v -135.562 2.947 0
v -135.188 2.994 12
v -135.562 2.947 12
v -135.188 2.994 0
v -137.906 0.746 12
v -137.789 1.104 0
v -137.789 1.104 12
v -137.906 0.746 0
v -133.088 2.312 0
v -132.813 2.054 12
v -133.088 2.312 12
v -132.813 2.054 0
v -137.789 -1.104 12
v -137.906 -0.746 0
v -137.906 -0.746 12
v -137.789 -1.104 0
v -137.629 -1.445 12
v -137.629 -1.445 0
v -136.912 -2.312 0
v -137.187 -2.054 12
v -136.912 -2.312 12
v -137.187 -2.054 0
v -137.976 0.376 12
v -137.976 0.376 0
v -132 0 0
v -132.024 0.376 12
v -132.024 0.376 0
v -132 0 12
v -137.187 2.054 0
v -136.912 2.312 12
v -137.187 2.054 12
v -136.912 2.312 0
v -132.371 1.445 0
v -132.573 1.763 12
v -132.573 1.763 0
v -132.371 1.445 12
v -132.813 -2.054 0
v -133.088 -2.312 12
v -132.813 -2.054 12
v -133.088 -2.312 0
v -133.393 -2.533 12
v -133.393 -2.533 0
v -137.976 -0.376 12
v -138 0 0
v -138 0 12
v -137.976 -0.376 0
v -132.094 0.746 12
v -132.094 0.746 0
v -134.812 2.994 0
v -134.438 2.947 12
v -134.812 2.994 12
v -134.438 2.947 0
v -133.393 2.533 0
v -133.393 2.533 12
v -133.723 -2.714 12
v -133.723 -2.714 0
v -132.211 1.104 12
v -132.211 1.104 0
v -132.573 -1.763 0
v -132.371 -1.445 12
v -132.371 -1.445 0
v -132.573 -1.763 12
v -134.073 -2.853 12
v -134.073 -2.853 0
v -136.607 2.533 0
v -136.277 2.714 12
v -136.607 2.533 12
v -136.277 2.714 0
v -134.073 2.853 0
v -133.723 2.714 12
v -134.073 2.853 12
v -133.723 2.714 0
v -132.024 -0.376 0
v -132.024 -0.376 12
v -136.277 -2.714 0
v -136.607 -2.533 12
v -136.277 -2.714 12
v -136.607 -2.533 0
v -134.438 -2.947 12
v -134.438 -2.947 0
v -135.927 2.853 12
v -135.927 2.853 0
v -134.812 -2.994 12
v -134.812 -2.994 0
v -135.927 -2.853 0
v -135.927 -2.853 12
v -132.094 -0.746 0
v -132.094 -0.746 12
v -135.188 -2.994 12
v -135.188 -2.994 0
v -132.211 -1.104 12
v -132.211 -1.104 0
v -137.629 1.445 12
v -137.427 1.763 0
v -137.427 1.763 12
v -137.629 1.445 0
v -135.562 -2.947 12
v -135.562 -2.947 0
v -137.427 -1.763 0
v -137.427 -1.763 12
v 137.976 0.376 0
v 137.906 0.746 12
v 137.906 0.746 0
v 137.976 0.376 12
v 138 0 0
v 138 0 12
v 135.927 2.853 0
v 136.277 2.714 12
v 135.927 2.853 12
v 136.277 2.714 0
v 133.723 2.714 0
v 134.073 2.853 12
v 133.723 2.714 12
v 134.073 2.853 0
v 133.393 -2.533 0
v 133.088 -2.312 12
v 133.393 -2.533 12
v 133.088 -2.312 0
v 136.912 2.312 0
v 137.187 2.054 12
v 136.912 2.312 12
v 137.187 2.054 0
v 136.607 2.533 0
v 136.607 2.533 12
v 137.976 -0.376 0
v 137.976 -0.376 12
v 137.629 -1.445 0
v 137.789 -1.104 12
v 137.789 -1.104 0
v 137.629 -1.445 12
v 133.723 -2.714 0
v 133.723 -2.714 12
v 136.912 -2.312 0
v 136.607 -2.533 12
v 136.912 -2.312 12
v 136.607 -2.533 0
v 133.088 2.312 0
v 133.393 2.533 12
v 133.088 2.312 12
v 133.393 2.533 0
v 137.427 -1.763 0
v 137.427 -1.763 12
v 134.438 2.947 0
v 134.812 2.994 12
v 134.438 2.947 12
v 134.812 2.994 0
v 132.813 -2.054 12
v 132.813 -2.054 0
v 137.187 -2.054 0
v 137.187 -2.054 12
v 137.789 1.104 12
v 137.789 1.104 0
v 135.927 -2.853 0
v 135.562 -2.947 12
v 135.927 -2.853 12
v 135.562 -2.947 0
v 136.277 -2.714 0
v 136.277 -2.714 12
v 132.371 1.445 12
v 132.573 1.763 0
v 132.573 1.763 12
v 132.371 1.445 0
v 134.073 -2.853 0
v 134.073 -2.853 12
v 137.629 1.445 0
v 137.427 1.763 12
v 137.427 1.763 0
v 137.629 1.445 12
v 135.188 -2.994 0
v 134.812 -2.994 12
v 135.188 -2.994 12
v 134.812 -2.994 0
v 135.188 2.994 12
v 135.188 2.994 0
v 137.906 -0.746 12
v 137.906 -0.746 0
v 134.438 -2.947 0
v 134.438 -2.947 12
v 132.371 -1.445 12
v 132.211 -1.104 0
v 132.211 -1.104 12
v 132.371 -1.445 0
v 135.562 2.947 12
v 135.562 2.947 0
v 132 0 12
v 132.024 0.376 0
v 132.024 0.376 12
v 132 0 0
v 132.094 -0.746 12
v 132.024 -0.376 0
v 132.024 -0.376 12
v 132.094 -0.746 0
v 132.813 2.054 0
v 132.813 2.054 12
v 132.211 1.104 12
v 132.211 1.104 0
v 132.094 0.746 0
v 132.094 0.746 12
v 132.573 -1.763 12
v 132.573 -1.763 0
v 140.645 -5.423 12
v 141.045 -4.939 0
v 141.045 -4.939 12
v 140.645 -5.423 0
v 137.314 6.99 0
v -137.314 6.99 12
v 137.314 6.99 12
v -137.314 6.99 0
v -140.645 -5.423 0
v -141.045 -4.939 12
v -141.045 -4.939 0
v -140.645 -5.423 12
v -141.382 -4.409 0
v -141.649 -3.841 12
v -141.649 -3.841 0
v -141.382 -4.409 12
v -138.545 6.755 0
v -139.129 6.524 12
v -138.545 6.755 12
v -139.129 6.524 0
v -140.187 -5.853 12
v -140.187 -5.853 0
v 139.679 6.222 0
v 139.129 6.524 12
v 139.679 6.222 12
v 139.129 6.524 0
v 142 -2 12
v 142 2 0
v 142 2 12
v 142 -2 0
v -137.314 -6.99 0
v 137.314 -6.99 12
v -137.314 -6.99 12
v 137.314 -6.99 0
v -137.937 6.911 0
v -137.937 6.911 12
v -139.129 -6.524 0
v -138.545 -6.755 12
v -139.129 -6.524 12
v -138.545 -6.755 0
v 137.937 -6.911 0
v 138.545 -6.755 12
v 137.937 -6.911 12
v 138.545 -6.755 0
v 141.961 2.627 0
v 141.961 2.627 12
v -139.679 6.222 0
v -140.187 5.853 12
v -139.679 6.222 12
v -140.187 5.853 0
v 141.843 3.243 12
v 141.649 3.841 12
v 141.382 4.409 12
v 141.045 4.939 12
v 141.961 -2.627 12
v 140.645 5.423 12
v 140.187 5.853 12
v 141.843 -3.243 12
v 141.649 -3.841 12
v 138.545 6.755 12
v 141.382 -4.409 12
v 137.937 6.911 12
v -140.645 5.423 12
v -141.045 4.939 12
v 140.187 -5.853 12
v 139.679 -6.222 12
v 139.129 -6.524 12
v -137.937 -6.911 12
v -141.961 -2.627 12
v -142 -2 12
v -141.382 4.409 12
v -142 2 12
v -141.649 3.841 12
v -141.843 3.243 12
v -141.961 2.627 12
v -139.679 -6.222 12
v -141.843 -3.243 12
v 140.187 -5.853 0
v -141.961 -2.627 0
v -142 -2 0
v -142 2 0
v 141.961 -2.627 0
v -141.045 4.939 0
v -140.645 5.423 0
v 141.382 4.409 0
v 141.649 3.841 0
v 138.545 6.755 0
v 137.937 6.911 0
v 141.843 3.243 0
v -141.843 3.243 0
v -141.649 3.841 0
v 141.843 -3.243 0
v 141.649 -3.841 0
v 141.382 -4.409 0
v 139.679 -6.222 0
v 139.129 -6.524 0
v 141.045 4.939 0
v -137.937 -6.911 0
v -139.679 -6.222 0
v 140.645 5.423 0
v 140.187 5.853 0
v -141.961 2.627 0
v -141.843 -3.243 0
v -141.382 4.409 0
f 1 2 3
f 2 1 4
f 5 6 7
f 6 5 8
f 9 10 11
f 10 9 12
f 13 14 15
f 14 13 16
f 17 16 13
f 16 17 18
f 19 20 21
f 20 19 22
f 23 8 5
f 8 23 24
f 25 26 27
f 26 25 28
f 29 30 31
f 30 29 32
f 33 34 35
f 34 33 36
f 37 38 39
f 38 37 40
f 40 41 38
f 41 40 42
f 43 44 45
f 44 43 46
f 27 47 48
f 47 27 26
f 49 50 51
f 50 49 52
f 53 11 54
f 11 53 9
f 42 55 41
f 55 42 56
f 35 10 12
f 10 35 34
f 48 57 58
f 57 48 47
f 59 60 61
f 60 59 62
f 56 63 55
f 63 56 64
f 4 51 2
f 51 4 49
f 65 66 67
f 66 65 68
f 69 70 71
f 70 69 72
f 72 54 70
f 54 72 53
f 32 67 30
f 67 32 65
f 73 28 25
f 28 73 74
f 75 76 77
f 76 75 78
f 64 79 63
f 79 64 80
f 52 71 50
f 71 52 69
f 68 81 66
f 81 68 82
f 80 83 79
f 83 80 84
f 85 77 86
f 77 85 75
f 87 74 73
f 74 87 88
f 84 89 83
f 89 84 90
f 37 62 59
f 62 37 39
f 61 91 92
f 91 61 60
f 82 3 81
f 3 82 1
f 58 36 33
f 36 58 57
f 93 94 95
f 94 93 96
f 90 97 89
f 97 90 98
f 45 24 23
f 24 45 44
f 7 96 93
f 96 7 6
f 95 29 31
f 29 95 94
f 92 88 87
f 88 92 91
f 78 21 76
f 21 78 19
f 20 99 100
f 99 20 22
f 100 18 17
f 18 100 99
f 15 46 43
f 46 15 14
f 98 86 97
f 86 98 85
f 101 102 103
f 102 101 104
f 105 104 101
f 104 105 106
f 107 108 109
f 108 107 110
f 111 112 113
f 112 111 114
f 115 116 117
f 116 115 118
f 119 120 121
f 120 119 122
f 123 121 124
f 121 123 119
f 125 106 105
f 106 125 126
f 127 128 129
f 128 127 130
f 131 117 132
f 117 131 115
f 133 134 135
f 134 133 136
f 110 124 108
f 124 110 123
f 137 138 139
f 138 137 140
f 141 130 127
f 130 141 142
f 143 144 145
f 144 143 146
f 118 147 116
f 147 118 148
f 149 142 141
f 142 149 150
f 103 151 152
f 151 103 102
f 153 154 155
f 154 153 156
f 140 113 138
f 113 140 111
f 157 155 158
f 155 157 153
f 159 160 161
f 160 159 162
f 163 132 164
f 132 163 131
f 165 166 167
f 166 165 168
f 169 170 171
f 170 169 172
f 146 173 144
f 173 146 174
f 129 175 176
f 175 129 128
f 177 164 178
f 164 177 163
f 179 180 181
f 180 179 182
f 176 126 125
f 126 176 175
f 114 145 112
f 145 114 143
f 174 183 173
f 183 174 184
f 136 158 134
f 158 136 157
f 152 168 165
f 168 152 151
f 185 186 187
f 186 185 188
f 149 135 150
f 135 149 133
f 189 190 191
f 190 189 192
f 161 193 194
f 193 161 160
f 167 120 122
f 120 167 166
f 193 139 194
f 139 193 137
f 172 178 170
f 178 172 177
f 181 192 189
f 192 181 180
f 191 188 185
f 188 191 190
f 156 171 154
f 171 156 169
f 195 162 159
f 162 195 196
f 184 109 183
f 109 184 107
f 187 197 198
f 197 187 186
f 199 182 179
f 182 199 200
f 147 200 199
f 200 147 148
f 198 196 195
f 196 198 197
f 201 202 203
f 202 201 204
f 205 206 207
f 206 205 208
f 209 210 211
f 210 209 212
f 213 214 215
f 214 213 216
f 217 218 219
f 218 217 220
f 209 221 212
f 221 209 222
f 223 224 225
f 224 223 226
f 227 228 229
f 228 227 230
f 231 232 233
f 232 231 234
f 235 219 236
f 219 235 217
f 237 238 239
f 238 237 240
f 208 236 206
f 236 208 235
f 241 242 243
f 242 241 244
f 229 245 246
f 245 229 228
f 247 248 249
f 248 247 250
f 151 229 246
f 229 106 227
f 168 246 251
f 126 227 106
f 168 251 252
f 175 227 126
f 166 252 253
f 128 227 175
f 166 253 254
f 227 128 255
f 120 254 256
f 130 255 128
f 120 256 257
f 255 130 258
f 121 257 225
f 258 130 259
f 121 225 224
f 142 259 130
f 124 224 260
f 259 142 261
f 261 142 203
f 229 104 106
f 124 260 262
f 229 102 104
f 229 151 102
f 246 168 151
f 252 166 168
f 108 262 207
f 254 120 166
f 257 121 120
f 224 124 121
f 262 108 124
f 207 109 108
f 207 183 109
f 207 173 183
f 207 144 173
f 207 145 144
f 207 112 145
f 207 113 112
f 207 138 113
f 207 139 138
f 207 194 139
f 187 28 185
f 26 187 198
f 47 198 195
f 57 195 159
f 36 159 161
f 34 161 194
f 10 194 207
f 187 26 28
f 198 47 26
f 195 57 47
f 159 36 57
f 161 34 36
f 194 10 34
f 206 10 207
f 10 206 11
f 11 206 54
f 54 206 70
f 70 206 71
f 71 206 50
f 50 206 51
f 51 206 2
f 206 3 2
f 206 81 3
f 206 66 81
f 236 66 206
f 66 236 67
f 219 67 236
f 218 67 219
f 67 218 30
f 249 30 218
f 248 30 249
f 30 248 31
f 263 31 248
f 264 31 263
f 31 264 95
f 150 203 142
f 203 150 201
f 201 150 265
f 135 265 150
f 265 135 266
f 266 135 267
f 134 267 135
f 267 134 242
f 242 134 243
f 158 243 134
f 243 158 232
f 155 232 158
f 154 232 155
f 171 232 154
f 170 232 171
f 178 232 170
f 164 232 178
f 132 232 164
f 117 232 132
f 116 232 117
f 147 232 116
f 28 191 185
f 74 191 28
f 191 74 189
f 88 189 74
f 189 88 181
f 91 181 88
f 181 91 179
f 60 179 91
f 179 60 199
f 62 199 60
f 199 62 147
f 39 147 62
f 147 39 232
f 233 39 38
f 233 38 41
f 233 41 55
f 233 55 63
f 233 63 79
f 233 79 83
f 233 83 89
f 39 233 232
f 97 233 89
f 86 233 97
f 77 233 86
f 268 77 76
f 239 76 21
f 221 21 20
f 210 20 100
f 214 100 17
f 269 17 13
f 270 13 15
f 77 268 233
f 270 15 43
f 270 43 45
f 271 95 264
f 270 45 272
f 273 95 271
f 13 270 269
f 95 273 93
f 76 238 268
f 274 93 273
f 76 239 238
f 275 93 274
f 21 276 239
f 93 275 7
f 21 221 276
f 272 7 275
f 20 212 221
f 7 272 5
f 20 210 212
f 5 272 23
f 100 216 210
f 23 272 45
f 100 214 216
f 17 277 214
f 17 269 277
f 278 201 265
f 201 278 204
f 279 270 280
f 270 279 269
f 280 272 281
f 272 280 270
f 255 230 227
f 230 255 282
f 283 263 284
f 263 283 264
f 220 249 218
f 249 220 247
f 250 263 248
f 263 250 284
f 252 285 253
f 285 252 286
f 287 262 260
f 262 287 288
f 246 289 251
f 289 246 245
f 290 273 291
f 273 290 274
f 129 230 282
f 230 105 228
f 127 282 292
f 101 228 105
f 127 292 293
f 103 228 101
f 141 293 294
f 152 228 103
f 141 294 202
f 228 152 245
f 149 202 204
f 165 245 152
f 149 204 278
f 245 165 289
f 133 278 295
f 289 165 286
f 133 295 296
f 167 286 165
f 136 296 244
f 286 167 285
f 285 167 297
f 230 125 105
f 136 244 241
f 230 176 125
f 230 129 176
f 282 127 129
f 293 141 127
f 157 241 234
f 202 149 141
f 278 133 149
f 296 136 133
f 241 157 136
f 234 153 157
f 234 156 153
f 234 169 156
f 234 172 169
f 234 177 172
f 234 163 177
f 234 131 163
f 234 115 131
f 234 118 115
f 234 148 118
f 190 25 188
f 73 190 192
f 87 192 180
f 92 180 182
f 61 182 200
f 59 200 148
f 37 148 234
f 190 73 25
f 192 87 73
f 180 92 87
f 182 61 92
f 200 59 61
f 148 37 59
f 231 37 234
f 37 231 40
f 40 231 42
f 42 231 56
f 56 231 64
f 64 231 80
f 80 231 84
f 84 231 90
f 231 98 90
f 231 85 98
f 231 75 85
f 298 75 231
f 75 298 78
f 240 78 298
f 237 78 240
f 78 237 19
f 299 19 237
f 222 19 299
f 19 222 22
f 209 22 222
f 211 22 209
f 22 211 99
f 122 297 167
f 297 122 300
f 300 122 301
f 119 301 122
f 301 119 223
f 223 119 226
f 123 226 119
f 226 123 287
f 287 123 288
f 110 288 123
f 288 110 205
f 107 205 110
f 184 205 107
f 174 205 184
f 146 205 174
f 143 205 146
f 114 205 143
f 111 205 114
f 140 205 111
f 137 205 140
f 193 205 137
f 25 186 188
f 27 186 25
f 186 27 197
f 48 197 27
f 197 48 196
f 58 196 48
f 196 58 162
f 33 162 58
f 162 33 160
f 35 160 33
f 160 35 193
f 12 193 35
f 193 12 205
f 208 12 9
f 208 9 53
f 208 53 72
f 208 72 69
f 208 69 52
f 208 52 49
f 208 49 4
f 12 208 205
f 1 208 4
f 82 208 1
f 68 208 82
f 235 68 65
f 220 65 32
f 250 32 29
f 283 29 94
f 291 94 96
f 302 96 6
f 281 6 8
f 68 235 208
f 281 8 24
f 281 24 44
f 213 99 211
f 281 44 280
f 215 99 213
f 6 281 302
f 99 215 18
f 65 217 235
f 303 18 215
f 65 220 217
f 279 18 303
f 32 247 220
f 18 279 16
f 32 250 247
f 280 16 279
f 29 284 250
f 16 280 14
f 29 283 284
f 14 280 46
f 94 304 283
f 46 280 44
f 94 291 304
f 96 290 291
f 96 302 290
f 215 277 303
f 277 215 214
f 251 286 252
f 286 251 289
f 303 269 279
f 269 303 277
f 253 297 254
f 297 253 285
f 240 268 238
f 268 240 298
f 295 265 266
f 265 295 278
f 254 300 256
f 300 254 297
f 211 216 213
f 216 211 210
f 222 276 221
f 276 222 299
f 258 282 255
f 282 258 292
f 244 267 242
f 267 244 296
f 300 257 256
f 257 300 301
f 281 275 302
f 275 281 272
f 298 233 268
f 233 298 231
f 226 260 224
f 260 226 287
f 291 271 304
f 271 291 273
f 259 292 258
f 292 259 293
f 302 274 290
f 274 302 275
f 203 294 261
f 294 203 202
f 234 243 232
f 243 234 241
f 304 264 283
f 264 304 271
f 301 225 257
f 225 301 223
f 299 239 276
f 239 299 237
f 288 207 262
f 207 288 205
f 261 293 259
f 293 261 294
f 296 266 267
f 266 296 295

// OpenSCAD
$fn = 50;


difference() {
	union() {
		hull() {
			translate(v = [-137.0000000000, 2.0000000000, 0]) {
				cylinder(h = 12, r = 5);
			}
			translate(v = [137.0000000000, 2.0000000000, 0]) {
				cylinder(h = 12, r = 5);
			}
			translate(v = [-137.0000000000, -2.0000000000, 0]) {
				cylinder(h = 12, r = 5);
			}
			translate(v = [137.0000000000, -2.0000000000, 0]) {
				cylinder(h = 12, r = 5);
			}
		}
	}
	union() {
		translate(v = [-135.0000000000, 0.0000000000, -100.0000000000]) {
			cylinder(h = 200, r = 3.0000000000);
		}
		translate(v = [-135.0000000000, 0.0000000000, -100.0000000000]) {
			cylinder(h = 200, r = 3.0000000000);
		}
		translate(v = [135.0000000000, 0.0000000000, -100.0000000000]) {
			cylinder(h = 200, r = 3.0000000000);
		}
		translate(v = [135.0000000000, 0.0000000000, -100.0000000000]) {
			cylinder(h = 200, r = 3.0000000000);
		}
	}
}
